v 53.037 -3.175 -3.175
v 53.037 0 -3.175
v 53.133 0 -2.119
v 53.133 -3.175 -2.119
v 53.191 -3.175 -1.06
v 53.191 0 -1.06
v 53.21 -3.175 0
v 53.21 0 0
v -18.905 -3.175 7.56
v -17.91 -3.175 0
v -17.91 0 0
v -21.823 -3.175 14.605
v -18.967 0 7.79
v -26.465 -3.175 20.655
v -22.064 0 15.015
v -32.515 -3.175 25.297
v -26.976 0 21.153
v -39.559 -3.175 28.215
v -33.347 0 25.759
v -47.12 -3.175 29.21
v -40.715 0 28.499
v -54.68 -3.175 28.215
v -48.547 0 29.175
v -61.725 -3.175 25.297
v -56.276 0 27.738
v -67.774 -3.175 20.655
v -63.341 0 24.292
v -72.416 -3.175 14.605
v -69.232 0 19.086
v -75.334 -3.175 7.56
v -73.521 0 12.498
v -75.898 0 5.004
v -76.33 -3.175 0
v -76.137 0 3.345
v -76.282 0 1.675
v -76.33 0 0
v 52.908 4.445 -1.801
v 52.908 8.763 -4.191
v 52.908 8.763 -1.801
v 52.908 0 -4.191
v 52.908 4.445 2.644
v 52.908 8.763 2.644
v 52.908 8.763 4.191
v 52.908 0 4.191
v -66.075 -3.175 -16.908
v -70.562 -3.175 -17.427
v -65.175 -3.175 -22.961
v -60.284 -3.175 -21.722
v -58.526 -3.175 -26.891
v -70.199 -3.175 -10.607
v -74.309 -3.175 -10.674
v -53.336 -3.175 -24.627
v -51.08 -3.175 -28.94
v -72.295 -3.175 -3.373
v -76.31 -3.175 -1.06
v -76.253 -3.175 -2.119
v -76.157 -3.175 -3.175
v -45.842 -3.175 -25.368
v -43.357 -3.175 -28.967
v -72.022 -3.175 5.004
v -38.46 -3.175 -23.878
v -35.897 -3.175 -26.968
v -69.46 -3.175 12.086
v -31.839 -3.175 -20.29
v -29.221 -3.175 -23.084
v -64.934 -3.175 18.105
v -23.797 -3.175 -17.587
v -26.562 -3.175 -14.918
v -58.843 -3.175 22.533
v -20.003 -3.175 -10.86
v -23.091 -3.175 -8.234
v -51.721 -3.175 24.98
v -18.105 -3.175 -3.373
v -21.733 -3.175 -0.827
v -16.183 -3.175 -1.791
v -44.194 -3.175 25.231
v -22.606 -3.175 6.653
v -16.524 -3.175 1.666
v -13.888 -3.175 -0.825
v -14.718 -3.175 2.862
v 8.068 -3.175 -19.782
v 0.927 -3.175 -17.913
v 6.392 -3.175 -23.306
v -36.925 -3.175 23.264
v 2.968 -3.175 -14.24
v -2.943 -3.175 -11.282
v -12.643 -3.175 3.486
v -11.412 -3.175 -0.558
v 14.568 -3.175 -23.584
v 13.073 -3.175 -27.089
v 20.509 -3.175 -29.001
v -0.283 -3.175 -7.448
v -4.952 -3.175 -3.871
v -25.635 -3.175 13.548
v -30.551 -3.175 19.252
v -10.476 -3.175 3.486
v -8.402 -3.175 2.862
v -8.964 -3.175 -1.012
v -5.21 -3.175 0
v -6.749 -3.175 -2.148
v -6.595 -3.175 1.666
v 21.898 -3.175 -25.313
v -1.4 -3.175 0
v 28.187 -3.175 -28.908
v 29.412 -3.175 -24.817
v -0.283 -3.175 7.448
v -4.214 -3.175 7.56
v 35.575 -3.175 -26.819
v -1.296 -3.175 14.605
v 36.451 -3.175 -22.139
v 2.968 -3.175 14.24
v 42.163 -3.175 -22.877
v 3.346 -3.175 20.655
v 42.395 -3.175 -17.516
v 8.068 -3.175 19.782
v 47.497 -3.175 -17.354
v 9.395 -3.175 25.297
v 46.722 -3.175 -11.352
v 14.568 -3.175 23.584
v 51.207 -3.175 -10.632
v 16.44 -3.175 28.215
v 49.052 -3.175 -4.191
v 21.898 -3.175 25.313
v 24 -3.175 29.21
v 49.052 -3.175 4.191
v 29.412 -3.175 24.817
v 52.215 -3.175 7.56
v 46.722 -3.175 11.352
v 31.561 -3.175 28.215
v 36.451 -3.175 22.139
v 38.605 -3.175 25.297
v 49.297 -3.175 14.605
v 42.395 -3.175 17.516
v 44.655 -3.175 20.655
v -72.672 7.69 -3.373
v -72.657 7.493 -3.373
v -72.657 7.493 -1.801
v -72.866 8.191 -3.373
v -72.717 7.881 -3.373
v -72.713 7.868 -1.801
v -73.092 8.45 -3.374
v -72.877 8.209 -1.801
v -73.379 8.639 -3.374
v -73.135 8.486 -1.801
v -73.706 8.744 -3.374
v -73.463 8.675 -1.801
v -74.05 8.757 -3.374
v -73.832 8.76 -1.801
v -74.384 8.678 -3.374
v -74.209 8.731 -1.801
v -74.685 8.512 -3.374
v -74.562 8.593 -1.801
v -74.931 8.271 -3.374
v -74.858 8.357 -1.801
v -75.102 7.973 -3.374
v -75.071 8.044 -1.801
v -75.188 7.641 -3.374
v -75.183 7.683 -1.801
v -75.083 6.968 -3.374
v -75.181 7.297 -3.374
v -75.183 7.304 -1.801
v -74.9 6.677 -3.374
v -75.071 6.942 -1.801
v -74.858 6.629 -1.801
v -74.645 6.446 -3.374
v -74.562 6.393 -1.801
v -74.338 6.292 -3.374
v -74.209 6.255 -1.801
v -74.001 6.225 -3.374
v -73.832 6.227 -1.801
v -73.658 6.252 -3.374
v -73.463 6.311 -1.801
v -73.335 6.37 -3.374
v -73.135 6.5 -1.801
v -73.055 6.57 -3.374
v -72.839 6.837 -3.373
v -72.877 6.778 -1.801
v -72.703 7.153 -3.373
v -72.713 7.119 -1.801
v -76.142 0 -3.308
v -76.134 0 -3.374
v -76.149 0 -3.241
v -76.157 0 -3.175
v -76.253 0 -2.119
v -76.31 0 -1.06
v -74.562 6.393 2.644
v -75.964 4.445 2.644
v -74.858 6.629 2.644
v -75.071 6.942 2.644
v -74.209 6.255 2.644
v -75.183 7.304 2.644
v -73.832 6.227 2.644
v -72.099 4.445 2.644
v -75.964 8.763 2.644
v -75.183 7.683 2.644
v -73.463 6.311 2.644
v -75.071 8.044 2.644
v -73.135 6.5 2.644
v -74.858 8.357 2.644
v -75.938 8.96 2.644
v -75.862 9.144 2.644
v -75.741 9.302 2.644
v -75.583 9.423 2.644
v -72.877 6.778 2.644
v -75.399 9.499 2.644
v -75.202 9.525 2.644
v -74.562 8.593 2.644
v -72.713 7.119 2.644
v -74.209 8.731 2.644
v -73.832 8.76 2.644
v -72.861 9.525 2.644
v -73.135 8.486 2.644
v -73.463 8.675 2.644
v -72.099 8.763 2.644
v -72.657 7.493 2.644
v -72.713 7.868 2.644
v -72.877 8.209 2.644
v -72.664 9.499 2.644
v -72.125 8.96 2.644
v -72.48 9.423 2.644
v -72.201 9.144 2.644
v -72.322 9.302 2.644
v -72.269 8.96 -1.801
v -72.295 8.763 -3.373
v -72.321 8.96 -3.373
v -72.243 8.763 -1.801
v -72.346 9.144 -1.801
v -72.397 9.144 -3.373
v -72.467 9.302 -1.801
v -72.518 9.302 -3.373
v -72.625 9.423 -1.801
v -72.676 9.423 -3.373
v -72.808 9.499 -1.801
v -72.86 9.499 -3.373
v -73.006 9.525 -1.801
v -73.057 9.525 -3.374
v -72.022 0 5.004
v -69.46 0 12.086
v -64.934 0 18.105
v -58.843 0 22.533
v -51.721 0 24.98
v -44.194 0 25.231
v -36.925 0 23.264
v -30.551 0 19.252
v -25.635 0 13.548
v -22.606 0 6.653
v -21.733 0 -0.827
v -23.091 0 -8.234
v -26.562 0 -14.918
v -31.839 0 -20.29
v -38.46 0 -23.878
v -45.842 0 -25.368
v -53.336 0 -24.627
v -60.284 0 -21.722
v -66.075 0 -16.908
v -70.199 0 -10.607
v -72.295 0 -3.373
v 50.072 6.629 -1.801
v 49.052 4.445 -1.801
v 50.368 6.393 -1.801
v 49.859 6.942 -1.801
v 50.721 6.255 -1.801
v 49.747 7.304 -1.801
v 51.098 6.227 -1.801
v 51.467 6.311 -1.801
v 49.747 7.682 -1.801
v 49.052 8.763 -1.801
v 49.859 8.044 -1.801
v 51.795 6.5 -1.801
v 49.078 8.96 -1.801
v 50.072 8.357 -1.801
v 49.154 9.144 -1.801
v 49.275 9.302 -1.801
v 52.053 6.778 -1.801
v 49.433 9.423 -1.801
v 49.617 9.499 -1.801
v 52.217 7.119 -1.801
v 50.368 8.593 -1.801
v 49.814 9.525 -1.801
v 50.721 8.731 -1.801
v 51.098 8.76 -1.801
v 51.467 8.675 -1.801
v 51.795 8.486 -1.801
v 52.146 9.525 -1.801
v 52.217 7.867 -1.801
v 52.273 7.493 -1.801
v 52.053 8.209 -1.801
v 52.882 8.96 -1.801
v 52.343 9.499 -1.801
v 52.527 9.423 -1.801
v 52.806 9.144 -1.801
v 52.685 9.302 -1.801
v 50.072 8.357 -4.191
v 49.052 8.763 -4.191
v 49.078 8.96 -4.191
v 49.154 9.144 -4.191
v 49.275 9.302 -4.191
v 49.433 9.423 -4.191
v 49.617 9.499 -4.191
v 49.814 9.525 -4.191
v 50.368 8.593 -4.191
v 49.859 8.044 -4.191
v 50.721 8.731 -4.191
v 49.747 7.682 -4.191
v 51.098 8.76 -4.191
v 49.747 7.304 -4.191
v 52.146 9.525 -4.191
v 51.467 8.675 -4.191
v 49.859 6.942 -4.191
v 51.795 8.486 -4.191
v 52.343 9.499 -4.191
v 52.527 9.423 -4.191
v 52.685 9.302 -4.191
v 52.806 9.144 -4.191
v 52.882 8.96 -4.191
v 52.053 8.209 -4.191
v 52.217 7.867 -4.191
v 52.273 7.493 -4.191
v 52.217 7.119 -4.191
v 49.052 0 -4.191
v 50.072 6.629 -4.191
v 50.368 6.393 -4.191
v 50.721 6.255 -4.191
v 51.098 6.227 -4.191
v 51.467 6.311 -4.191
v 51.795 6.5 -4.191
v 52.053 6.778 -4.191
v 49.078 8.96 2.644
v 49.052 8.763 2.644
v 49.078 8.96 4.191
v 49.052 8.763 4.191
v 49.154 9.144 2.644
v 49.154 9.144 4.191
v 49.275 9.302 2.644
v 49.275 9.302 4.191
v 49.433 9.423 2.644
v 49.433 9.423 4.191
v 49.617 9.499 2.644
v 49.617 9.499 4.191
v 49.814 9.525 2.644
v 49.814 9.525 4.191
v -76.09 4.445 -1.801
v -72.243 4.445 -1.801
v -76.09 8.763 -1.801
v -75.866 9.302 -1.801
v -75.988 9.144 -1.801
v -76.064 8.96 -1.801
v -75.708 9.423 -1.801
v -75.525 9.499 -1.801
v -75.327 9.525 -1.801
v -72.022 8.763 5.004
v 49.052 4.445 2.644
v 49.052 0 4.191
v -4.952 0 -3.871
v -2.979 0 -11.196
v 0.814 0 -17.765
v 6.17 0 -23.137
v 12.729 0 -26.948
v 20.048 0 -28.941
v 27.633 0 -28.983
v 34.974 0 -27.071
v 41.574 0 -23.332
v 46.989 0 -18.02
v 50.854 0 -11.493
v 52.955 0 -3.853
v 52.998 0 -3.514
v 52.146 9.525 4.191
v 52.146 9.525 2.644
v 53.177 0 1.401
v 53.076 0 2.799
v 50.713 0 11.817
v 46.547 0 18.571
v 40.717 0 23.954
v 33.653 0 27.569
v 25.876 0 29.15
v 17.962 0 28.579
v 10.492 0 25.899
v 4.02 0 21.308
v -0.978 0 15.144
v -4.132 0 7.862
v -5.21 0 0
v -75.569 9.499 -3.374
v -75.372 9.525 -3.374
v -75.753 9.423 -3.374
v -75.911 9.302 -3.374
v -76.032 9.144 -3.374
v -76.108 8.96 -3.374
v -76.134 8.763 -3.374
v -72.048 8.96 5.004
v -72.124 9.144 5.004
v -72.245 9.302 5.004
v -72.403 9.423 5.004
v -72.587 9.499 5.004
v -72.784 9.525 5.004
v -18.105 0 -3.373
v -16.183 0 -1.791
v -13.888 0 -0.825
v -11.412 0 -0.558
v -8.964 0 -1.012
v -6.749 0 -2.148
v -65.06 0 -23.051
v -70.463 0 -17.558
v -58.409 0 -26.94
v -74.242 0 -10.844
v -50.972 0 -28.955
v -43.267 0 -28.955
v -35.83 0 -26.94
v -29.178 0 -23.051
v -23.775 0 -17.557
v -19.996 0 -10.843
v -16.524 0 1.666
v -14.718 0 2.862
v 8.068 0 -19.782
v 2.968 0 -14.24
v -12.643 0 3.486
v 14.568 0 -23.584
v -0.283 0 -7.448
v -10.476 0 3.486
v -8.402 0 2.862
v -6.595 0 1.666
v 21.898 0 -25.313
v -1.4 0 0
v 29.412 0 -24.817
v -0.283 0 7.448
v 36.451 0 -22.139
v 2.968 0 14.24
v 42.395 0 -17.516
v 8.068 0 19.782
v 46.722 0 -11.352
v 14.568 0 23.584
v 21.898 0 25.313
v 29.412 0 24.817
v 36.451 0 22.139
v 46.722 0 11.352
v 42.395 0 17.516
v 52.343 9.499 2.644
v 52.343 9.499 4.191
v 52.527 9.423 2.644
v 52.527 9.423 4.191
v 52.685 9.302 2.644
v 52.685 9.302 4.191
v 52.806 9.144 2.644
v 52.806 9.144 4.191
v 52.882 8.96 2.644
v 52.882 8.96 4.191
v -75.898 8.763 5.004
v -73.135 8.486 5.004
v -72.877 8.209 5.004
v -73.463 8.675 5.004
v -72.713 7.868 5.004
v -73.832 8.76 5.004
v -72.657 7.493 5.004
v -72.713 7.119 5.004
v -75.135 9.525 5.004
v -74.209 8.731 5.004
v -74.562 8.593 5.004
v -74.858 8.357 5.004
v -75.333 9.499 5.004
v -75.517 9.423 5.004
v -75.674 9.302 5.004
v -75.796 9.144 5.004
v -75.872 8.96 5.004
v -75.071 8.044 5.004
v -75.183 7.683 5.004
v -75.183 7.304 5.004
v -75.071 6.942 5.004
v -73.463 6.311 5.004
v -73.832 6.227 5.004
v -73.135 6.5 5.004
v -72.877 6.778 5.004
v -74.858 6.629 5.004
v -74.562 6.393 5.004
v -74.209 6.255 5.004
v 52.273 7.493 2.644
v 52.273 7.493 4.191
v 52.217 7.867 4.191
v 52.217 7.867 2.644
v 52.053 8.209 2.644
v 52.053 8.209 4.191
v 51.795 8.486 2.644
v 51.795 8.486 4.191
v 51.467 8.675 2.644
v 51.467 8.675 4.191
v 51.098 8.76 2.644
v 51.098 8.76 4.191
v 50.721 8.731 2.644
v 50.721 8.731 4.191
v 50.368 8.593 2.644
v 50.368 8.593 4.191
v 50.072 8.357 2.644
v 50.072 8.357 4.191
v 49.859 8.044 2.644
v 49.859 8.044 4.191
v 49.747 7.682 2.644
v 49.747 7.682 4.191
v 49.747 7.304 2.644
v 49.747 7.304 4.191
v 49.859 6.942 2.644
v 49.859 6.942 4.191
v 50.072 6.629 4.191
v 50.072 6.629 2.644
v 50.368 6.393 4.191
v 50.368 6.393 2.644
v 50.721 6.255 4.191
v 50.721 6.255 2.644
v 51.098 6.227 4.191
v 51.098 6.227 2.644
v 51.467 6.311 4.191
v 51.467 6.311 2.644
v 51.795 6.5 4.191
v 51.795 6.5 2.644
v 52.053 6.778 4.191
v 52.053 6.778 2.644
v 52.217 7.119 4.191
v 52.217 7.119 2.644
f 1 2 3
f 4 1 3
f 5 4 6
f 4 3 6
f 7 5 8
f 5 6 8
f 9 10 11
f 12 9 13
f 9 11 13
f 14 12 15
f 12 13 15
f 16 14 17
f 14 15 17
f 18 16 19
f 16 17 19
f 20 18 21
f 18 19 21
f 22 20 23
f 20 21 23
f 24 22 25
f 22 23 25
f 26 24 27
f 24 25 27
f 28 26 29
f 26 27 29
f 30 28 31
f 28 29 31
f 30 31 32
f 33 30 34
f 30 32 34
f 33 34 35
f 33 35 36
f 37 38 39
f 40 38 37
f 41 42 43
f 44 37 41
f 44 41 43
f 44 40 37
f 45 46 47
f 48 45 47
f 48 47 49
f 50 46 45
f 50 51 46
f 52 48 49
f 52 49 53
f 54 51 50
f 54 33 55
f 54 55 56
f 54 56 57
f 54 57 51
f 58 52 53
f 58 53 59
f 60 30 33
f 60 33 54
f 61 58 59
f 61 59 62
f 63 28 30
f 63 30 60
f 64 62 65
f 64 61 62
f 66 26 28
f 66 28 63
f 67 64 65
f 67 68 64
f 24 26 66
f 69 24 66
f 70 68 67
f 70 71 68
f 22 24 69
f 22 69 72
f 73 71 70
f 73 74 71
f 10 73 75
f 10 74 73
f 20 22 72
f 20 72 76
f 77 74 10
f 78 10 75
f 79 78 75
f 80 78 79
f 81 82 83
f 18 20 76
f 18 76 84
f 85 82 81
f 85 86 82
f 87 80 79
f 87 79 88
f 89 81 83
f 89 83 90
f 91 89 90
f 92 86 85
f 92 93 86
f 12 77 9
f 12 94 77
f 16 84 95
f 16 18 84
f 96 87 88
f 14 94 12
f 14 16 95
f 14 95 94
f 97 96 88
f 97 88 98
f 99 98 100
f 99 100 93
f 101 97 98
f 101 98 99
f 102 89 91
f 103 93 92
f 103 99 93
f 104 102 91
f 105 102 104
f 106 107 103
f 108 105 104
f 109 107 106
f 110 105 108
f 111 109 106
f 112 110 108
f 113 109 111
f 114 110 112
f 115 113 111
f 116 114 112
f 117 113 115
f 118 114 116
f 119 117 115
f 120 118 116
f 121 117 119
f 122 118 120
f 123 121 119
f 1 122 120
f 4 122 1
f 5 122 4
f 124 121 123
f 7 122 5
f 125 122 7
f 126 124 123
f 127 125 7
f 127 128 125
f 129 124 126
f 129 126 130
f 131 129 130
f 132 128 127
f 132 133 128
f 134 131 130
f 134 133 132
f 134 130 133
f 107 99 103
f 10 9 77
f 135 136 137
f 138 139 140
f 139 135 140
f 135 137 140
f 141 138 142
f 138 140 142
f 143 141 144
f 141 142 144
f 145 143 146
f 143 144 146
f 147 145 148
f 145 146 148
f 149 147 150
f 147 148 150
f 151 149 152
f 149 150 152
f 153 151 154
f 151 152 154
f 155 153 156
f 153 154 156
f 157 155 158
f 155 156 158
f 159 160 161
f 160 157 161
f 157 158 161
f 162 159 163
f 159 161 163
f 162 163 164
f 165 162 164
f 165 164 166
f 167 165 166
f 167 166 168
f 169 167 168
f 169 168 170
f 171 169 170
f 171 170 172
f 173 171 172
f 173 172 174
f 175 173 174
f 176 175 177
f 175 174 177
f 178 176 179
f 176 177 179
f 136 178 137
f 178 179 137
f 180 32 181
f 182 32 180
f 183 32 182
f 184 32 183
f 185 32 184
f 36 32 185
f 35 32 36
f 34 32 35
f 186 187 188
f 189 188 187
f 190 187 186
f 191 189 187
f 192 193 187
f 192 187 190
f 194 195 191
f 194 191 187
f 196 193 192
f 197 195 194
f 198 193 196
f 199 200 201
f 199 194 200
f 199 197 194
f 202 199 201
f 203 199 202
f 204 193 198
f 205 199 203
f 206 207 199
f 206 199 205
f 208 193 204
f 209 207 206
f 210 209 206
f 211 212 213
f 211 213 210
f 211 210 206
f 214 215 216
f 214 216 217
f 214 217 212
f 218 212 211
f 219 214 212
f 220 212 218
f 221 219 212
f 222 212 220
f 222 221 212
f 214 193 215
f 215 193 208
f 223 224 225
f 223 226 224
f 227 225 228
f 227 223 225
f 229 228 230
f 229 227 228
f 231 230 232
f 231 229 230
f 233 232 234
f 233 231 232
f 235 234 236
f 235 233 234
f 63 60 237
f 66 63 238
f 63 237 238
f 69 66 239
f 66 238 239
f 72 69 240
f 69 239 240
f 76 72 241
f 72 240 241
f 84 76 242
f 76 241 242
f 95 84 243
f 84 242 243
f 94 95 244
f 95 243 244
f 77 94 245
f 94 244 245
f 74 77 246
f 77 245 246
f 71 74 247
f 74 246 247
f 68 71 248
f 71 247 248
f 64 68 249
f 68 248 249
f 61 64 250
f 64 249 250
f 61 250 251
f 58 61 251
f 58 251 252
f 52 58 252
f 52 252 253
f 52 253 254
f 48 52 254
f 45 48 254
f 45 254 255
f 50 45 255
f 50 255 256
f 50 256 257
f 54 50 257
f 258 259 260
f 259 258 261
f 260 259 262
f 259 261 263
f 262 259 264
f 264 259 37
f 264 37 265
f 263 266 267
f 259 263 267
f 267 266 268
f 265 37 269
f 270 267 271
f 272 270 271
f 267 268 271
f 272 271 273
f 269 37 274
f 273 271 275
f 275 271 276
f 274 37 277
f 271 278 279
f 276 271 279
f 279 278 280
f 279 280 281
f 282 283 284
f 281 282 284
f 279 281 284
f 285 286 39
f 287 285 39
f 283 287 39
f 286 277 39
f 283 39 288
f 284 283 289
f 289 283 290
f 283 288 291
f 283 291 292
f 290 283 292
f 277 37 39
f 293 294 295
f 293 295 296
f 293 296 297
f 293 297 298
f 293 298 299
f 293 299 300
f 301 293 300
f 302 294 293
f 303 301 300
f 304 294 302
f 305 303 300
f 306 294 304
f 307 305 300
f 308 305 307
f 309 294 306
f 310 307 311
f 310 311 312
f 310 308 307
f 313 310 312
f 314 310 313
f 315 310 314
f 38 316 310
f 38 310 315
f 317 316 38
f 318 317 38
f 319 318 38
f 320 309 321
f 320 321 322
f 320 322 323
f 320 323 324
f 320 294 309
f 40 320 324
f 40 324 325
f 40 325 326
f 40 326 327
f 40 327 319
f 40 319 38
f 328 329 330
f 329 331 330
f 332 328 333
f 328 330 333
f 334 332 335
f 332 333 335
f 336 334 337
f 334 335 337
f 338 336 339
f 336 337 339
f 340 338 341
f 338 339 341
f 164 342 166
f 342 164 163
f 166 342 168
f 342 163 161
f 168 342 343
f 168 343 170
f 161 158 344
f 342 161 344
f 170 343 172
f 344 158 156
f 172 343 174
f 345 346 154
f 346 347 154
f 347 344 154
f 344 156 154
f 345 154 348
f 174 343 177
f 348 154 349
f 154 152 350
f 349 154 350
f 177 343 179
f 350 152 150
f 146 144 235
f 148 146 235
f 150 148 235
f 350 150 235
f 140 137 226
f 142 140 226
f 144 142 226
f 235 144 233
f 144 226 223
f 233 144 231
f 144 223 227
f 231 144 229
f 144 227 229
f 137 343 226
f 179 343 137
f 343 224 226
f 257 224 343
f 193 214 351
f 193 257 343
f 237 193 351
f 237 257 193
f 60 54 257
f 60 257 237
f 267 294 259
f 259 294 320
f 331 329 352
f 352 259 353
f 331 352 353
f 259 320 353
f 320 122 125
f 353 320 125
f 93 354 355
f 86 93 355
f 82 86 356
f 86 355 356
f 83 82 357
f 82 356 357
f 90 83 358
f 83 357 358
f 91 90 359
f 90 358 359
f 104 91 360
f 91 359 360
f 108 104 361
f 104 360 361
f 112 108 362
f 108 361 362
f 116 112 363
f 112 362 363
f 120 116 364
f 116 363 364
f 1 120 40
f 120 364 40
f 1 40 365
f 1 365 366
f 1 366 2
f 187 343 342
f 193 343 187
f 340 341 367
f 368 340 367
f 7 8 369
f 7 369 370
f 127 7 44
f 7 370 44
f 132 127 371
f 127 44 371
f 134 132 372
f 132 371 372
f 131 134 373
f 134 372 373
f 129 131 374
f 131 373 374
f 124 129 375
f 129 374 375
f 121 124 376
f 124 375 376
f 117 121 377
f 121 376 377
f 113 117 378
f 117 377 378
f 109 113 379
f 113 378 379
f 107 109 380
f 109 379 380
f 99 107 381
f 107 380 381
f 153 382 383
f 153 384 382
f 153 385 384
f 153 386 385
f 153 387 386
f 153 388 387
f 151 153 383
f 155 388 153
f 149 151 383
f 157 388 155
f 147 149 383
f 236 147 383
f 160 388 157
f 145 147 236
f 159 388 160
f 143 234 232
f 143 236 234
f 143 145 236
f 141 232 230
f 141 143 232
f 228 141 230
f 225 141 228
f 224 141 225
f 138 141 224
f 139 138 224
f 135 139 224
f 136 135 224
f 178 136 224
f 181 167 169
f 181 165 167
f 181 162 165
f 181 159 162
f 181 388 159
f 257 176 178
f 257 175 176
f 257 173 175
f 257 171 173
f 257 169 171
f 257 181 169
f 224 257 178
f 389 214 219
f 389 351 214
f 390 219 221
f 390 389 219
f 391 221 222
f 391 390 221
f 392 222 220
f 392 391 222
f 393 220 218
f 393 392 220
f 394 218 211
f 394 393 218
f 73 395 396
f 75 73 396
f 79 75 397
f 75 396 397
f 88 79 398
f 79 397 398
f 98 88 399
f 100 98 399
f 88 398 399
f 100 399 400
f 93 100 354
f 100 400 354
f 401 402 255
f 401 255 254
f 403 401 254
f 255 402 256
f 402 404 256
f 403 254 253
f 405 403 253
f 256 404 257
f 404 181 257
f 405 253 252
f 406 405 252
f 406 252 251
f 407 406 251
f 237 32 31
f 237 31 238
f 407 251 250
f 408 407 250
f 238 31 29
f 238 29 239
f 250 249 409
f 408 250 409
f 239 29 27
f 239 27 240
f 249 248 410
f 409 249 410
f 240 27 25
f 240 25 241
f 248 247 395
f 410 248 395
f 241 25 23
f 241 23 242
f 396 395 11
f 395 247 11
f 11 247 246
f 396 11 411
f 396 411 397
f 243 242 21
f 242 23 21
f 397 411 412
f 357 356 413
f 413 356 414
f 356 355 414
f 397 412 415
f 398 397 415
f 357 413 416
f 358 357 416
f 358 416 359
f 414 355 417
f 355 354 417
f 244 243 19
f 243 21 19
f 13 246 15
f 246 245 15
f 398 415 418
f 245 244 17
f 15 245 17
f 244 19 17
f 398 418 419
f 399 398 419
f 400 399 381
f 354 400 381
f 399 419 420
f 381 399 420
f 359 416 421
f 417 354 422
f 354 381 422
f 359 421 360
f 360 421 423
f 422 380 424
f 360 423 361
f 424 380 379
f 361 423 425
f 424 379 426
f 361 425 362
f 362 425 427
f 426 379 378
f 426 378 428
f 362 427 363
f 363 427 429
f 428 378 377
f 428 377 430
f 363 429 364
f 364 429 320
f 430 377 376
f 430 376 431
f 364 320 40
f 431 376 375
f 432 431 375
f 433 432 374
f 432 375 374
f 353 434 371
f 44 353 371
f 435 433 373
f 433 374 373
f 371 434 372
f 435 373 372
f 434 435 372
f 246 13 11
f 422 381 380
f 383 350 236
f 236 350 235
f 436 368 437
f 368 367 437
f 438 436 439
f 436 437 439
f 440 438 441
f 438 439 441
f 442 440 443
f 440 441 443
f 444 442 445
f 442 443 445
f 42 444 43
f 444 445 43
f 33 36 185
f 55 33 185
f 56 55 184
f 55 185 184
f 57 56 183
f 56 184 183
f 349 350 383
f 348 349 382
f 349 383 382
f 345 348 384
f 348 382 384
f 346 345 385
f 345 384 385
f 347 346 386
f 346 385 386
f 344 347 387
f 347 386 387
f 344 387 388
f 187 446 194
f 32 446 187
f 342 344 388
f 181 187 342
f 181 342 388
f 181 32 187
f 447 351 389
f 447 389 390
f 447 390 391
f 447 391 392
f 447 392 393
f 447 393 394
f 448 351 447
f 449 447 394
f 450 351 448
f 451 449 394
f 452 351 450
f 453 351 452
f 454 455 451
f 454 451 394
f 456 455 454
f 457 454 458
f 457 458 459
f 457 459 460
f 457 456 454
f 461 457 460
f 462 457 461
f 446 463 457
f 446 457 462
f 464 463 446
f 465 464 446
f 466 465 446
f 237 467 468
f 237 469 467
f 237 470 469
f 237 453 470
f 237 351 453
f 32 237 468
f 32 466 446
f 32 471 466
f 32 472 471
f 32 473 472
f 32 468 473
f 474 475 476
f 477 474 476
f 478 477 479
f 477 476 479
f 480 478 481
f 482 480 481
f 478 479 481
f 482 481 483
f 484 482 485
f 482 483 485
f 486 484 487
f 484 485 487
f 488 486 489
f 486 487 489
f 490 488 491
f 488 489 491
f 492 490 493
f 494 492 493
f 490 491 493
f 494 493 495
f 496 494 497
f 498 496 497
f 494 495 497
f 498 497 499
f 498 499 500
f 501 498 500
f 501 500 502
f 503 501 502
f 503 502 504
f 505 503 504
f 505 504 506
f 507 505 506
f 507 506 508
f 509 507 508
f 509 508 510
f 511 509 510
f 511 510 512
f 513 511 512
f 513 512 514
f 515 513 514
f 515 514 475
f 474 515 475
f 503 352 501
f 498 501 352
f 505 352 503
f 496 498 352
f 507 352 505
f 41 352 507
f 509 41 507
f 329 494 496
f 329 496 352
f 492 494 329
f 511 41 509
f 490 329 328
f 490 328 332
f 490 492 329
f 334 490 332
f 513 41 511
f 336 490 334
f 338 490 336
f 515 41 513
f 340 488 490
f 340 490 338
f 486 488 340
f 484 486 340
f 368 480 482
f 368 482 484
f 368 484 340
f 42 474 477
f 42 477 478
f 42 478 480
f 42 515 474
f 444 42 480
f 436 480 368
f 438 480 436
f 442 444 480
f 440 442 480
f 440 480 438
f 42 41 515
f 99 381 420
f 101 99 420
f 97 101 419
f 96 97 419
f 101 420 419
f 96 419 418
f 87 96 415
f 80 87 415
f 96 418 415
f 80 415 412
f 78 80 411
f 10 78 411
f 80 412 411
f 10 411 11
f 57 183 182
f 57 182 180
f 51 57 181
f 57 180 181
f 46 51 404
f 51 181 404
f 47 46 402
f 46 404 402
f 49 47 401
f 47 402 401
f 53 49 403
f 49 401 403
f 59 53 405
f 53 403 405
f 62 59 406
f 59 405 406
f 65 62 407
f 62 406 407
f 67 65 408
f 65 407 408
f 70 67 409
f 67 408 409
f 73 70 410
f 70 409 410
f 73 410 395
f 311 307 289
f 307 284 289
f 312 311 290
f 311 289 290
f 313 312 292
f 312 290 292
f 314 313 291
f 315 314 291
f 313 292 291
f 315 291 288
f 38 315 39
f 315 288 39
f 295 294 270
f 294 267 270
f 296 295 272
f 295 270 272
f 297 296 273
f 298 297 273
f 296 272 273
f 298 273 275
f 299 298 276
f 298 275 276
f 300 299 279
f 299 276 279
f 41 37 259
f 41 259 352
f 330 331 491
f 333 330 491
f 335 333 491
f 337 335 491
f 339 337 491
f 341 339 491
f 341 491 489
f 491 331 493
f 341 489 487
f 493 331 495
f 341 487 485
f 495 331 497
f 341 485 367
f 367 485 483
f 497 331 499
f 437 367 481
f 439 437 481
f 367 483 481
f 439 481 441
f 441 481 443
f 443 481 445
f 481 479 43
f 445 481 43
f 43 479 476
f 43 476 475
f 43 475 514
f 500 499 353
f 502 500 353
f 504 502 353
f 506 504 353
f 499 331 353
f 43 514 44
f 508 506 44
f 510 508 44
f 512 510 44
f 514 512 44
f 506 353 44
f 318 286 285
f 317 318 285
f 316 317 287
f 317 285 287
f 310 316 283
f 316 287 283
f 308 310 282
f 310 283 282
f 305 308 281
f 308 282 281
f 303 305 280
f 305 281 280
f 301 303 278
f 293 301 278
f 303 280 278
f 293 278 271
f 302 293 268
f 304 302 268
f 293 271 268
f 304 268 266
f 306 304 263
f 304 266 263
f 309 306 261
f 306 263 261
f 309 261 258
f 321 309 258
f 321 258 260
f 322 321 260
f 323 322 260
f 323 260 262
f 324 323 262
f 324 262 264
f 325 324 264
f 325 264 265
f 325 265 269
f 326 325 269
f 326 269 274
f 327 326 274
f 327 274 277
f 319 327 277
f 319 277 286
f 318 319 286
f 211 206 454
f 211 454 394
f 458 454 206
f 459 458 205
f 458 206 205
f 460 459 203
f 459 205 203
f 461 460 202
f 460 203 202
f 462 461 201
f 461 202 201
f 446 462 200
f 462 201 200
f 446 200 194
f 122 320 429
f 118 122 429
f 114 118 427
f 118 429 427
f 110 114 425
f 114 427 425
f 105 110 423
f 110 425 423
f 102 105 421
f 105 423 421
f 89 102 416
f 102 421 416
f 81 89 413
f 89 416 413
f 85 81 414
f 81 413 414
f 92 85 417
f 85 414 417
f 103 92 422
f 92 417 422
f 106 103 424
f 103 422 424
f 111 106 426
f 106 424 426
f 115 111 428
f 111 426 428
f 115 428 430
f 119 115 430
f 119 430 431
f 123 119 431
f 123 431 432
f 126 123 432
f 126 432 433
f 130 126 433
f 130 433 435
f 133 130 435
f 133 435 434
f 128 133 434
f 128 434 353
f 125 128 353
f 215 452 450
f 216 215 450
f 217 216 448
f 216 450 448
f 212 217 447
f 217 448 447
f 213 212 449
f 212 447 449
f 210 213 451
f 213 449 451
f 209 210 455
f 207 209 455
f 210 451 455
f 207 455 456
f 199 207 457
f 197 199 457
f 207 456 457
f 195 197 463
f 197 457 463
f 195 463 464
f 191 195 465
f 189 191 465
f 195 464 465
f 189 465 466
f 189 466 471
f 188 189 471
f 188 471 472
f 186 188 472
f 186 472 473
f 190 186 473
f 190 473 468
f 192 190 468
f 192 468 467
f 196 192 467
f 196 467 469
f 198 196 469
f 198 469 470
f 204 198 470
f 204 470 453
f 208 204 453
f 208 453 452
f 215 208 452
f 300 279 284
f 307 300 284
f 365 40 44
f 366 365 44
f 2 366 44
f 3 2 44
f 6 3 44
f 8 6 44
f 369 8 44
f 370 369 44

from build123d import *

# Parameters (mm, degrees)
F1_DEPTH = 3.175
F2_W     = 3.8559212309
F2_H     = 8.382
F3_DEPTH = 12.7
F4_W     = 5.08
F4_H     = 4.445
F5_DEPTH = 129.2387778288
F6_R     = 1.27
F7_DEPTH = 33.402
F8_R     = 1.27
F9_DEPTH = 34.2152275192
F10_R    = 0.762
F11_R    = 0.762


with BuildPart() as f1:
    # F0 (on Front) → F1 (new body)
    with BuildSketch(Plane.XZ):
        with BuildLine():
            ThreePointArc((-18.1050305715, -3.3733308155), (-17.9584921143, -1.6894938048), (-17.9095913851, 0))
            ThreePointArc((-17.9095913851, 0), (-47.1195913851, 29.21), (-76.3295913851, 0))
            Line((-76.3295913851, 0), (-72.5195913851, 0))
            ThreePointArc((-72.5195913851, 0), (-47.1195913851, 25.4), (-21.7195913851, 0))
            ThreePointArc((-21.7195913851, 0), (-45.5289694065, -25.3501463846), (-72.320372623, -3.175))
            Line((-72.320372623, -3.175), (-76.1565243327, -3.175))
            ThreePointArc((-76.1565243327, -3.175), (-47.2193857045, -29.2098295287), (-18.1050305715, -3.3733308155))
        make_face()
        with BuildLine():
            ThreePointArc((-5.2095913851, 0), (-11.5595913851, 3.5657379151), (-17.9095913851, 0))
            ThreePointArc((-17.9095913851, 0), (-17.9584921143, -1.6894938048), (-18.1050305715, -3.3733308155))
            ThreePointArc((-18.1050305715, -3.3733308155), (-11.412472054, -0.5582261258), (-4.9519179152, -3.871290288))
            ThreePointArc((-4.9519179152, -3.871290288), (-5.1451018279, -1.9399280986), (-5.2095913851, 0))
        make_face()
        with BuildLine():
            Line((-72.5195913851, 0), (-76.3295913851, 0))
            ThreePointArc((-76.3295913851, 0), (-76.2862925304, -1.589856692), (-76.1565243327, -3.175))
            Line((-76.1565243327, -3.175), (-72.320372623, -3.175))
            ThreePointArc((-72.320372623, -3.175), (-72.4697377697, -1.5906219786), (-72.5195913851, 0))
        make_face()
        with BuildLine():
            ThreePointArc((53.2104086149, 0), (24.0004086149, 29.21), (-5.2095913851, 0))
            ThreePointArc((-5.2095913851, 0), (-5.1451018279, -1.9399280986), (-4.9519179152, -3.871290288))
            ThreePointArc((-4.9519179152, -3.871290288), (24.3511144785, -29.2078945732), (53.0373415624, -3.175))
            Line((53.0373415624, -3.175), (49.2011898528, -3.175))
            ThreePointArc((49.2011898528, -3.175), (-1.3497377697, 1.5906219786), (49.4004086149, 0))
            Line((49.4004086149, 0), (53.2104086149, 0))
        make_face()
        with BuildLine():
            ThreePointArc((53.0373415624, -3.175), (53.1671097602, -1.589856692), (53.2104086149, 0))
            Line((53.2104086149, 0), (49.4004086149, 0))
            ThreePointArc((49.4004086149, 0), (49.3505549995, -1.5906219786), (49.2011898528, -3.175))
            Line((49.2011898528, -3.175), (53.0373415624, -3.175))
        make_face()
    extrude(amount=F1_DEPTH)

    # F2 (on face) → F3 (join)
    with BuildSketch(Plane.XZ.offset(3.175)):
        with Locations((50.9802258282, 0)):
            Rectangle(F2_W, F2_H)
        Polygon((-75.8977394655, 5.0042275192), (-76.1340230485, -3.3744414722), (-72.2945916673, -3.3733308155), (-72.0217540811, 5.0042275192), align=None)
    extrude(amount=-F3_DEPTH)

    # F4 (on face) → F5 (cut, through all)
    with BuildSketch(Plane.YZ.offset(52.9081864437)):
        with Locations((6.985, 0.4219774121)):
            Rectangle(F4_W, F4_H)
    extrude(amount=-F5_DEPTH, mode=Mode.SUBTRACT)

    # F6 (on face) → F7 (cut, through all)
    with BuildSketch(Plane.XY.offset(4.191)):
        with Locations((51.0031864437, 7.4931297261)):
            Circle(F6_R)
    extrude(amount=-F7_DEPTH, mode=Mode.SUBTRACT)

    # F8 (on face) → F9 (cut, through all)
    with BuildSketch(Plane.XY.offset(5.0042275192)):
        with Locations((-73.9267540811, 7.4932678616)):
            Circle(F8_R)
    extrude(amount=-F9_DEPTH, mode=Mode.SUBTRACT)

    # F10
    f10_edges = [f1.edges().sort_by_distance(p)[0] for p in [
        (49.052265, 9.525, 3.417739),
        (52.908186, 9.525, 3.417739),
        (52.908186, 9.525, -2.995761),
        (49.052265, 9.525, -2.995761),
    ]]
    fillet(f10_edges, radius=F10_R)

    # F11
    f11_edges = [f1.edges().sort_by_distance(p)[0] for p in [
        (-76.11183, 9.525, -2.587482),
        (-75.931013, 9.525, 3.824352),
        (-72.06018, 9.525, 3.824352),
        (-72.26898, 9.525, -2.586927),
    ]]
    fillet(f11_edges, radius=F11_R)


solid = f1.part
